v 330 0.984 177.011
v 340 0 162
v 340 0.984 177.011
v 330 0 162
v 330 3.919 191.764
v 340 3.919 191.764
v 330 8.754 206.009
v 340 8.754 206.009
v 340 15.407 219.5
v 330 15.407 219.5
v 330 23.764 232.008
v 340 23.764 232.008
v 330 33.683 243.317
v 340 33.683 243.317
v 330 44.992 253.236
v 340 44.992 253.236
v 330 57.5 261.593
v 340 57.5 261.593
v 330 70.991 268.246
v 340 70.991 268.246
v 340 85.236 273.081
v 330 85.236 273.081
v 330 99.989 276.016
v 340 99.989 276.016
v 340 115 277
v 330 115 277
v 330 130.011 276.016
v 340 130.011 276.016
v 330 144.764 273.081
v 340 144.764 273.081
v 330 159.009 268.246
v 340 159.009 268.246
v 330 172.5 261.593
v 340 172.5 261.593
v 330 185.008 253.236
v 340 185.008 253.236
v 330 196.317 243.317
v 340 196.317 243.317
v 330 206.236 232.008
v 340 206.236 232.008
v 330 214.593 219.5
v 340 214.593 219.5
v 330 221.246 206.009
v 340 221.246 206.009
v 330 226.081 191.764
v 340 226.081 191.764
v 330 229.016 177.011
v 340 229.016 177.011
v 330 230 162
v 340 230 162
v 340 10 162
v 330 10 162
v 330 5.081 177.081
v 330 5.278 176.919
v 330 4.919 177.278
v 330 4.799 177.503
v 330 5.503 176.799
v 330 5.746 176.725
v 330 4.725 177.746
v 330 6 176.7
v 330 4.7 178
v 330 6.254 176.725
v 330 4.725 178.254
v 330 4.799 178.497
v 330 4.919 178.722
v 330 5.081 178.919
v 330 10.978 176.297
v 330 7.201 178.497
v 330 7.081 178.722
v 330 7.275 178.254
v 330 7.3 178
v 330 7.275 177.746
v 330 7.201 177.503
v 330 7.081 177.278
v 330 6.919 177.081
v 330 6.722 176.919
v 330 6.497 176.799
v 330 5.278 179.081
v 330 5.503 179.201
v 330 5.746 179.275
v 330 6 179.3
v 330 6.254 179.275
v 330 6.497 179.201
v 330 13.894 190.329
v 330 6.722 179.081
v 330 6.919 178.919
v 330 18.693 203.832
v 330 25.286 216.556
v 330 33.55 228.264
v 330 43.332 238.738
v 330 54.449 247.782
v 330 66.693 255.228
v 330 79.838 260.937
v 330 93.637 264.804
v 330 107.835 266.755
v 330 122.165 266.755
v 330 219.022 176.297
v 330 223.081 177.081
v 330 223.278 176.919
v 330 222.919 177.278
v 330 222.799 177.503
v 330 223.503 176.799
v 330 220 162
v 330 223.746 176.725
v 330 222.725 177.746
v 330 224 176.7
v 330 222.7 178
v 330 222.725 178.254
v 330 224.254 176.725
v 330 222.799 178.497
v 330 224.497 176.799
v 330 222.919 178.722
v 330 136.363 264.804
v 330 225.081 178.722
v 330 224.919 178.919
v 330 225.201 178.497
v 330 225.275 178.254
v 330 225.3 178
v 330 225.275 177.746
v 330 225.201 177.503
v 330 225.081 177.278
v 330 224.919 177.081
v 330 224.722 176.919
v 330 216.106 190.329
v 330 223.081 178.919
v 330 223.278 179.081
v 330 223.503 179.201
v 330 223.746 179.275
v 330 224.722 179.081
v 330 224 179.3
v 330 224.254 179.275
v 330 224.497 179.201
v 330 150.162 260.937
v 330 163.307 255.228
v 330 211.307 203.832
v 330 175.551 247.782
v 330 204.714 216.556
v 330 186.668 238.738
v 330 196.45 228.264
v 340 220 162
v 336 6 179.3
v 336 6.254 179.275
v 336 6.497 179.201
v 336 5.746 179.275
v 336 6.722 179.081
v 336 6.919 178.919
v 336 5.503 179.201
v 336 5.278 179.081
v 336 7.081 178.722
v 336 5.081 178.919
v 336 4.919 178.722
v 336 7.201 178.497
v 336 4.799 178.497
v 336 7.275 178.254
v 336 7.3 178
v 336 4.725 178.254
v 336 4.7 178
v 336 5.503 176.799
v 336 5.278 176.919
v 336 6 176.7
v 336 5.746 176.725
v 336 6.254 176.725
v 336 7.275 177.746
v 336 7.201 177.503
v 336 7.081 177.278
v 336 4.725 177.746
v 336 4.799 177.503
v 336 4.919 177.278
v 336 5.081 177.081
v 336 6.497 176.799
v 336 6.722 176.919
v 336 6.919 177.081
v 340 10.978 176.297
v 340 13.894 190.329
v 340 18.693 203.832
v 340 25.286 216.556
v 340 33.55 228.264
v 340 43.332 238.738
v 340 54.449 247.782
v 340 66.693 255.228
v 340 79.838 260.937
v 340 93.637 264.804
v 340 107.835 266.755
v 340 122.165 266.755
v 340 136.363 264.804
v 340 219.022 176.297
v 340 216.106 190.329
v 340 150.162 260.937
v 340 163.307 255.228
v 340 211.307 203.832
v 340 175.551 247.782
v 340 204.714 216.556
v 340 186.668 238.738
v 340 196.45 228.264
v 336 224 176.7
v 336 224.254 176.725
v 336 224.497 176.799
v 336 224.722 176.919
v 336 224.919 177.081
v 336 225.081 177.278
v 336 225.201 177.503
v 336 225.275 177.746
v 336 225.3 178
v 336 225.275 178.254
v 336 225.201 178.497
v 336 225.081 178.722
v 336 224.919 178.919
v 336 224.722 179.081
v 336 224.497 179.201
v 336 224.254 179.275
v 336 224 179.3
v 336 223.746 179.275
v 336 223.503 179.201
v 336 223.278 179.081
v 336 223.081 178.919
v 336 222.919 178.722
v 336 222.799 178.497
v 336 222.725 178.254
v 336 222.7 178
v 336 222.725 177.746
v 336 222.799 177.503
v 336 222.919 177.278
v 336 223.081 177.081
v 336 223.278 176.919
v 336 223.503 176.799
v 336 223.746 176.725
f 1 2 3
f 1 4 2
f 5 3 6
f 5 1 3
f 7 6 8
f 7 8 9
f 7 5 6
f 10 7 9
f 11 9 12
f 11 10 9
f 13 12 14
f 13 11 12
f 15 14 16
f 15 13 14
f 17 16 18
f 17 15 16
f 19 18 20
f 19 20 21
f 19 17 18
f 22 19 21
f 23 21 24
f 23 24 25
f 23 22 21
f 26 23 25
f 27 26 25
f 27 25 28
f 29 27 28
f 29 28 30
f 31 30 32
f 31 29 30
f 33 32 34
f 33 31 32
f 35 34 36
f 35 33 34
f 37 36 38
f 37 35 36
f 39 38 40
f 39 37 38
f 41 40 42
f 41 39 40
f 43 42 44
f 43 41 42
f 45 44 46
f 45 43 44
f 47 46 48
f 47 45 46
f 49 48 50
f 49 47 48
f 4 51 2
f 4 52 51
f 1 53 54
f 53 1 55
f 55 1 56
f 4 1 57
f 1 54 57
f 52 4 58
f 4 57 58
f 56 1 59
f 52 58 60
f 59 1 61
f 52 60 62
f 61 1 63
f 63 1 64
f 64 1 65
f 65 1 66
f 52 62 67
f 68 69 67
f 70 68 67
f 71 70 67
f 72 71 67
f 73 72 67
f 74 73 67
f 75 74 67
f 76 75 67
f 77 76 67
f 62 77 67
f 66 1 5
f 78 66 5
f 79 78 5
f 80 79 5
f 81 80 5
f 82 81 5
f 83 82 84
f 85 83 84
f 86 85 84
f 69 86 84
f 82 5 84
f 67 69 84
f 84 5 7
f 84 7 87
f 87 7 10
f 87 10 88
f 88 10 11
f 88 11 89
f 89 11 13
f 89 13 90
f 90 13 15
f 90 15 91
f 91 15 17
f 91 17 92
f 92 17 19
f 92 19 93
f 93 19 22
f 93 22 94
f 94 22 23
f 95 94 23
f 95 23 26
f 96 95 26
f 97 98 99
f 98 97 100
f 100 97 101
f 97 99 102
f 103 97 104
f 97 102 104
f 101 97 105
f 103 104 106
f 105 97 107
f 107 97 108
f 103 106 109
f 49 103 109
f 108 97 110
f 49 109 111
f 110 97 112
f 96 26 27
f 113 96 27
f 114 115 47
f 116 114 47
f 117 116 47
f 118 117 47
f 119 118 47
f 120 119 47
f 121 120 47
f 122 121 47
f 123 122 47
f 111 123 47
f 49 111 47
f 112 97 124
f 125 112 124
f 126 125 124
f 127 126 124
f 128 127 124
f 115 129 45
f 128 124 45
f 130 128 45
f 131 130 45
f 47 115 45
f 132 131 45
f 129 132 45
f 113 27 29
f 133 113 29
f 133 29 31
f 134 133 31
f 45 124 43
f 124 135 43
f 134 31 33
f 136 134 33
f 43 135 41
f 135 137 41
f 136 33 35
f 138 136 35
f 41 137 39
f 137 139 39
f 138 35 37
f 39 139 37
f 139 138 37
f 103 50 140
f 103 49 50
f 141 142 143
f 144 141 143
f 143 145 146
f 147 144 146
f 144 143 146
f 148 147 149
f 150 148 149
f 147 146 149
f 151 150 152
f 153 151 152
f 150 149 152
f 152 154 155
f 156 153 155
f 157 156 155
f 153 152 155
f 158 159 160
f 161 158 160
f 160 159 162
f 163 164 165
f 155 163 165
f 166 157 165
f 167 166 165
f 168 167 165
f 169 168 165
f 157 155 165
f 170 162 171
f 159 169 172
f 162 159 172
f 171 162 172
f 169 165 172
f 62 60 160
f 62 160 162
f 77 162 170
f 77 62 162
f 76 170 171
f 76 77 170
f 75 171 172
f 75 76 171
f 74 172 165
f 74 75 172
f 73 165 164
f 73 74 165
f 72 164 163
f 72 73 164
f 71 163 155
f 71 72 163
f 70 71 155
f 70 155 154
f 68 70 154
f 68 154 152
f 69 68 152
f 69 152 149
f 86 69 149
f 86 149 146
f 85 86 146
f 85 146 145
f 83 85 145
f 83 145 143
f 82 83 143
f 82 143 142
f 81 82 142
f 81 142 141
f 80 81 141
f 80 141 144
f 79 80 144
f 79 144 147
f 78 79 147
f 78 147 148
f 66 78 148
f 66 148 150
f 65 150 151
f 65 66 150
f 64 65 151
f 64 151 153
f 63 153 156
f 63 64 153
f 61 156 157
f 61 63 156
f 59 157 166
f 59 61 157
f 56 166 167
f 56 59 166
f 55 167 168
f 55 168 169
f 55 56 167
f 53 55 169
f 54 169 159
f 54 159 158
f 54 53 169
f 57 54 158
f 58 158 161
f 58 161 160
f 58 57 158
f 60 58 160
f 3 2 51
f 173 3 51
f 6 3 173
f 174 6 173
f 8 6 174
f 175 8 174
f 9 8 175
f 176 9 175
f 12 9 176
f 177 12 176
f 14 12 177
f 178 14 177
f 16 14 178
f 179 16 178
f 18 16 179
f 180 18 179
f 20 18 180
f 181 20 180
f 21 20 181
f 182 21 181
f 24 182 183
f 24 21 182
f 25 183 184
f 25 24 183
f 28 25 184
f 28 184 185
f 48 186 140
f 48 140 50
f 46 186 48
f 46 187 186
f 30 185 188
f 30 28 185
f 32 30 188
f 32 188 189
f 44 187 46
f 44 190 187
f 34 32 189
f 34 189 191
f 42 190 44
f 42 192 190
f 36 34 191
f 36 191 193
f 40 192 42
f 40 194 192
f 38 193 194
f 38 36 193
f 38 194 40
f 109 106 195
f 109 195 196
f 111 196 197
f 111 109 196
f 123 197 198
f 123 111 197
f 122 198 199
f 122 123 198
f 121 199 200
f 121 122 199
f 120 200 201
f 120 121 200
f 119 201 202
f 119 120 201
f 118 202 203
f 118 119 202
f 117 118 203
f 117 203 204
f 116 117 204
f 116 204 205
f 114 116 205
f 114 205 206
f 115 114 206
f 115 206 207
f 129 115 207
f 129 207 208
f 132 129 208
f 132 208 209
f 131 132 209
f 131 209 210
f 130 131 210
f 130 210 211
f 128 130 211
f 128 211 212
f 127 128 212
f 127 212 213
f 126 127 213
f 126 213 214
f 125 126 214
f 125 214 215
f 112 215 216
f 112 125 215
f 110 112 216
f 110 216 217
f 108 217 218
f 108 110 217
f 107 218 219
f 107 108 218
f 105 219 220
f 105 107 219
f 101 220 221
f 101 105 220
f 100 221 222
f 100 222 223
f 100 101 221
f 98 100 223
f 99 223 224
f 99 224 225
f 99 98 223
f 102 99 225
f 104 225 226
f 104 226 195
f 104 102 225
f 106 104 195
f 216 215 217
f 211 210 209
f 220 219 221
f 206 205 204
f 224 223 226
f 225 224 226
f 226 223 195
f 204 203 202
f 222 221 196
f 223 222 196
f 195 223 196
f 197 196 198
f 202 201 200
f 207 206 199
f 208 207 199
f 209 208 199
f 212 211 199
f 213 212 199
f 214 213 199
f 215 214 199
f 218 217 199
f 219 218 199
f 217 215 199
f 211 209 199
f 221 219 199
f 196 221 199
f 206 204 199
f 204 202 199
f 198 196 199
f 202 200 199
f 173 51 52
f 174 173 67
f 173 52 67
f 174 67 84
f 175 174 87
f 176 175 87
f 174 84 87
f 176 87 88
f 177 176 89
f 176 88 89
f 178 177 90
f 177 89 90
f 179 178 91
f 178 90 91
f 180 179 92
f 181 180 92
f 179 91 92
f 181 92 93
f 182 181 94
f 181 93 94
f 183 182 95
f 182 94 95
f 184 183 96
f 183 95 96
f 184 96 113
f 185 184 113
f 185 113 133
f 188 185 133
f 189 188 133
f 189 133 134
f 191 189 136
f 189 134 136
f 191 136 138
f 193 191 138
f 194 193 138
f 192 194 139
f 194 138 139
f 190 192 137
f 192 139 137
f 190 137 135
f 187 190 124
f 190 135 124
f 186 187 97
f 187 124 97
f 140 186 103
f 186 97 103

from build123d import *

# Parameters (mm, degrees)
CYLINDER072_R     = 1.3
CYLINDER072_DEPTH = 331
CYLINDER061_R     = 1.3
CYLINDER061_DEPTH = 331
CYLINDER054_W     = 105
CYLINDER054_H     = 10
CYLINDER054_ANGLE = 180
CYLINDER053_W     = 115
CYLINDER053_H     = 10
CYLINDER053_ANGLE = 180


with BuildPart() as cilindro072:
    # Cylinder072 → Cylinder072 (new body)
    with BuildSketch(Plane(origin=(5, 224, 178), x_dir=(0, 0, -1), z_dir=(1, 0, 0))):
        Circle(CYLINDER072_R)
    extrude(amount=CYLINDER072_DEPTH)


with BuildPart() as cilindro061:
    # Cylinder061 → Cylinder061 (new body)
    with BuildSketch(Plane(origin=(5, 6, 178), x_dir=(0, 0, -1), z_dir=(1, 0, 0))):
        Circle(CYLINDER061_R)
    extrude(amount=CYLINDER061_DEPTH)


with BuildPart() as cilindro054:
    # Cylinder054 → Cylinder054 (revolve)
    with BuildSketch(Plane(origin=(-3, 115, 171), x_dir=(0, -1, 0), z_dir=(0, 0, -1))):
        with Locations((52.5, 5)):
            Rectangle(CYLINDER054_W, CYLINDER054_H)
    revolve(axis=Axis((-3, 115, 171), (-1, 0, 0)), revolution_arc=CYLINDER054_ANGLE)


with BuildPart() as cut081:
    # Cylinder053 → Cylinder053 (revolve)
    with BuildSketch(Plane(origin=(-3, 115, 171), x_dir=(0, -1, 0), z_dir=(0, 0, -1))):
        with Locations((57.5, 5)):
            Rectangle(CYLINDER053_W, CYLINDER053_H)
    revolve(axis=Axis((-3, 115, 171), (-1, 0, 0)), revolution_arc=CYLINDER053_ANGLE)

    # Cut067: cut Cilindro054
    add(cilindro054.part, mode=Mode.SUBTRACT)


with BuildPart() as cut081_1:
    # Cut067 placement: moved
    add(cut081.part.moved(Location((343, 0, -9))))

    # Cut072: cut Cilindro061
    add(cilindro061.part, mode=Mode.SUBTRACT)

    # Cut081: cut Cilindro072
    add(cilindro072.part, mode=Mode.SUBTRACT)


solid = cut081_1.part
